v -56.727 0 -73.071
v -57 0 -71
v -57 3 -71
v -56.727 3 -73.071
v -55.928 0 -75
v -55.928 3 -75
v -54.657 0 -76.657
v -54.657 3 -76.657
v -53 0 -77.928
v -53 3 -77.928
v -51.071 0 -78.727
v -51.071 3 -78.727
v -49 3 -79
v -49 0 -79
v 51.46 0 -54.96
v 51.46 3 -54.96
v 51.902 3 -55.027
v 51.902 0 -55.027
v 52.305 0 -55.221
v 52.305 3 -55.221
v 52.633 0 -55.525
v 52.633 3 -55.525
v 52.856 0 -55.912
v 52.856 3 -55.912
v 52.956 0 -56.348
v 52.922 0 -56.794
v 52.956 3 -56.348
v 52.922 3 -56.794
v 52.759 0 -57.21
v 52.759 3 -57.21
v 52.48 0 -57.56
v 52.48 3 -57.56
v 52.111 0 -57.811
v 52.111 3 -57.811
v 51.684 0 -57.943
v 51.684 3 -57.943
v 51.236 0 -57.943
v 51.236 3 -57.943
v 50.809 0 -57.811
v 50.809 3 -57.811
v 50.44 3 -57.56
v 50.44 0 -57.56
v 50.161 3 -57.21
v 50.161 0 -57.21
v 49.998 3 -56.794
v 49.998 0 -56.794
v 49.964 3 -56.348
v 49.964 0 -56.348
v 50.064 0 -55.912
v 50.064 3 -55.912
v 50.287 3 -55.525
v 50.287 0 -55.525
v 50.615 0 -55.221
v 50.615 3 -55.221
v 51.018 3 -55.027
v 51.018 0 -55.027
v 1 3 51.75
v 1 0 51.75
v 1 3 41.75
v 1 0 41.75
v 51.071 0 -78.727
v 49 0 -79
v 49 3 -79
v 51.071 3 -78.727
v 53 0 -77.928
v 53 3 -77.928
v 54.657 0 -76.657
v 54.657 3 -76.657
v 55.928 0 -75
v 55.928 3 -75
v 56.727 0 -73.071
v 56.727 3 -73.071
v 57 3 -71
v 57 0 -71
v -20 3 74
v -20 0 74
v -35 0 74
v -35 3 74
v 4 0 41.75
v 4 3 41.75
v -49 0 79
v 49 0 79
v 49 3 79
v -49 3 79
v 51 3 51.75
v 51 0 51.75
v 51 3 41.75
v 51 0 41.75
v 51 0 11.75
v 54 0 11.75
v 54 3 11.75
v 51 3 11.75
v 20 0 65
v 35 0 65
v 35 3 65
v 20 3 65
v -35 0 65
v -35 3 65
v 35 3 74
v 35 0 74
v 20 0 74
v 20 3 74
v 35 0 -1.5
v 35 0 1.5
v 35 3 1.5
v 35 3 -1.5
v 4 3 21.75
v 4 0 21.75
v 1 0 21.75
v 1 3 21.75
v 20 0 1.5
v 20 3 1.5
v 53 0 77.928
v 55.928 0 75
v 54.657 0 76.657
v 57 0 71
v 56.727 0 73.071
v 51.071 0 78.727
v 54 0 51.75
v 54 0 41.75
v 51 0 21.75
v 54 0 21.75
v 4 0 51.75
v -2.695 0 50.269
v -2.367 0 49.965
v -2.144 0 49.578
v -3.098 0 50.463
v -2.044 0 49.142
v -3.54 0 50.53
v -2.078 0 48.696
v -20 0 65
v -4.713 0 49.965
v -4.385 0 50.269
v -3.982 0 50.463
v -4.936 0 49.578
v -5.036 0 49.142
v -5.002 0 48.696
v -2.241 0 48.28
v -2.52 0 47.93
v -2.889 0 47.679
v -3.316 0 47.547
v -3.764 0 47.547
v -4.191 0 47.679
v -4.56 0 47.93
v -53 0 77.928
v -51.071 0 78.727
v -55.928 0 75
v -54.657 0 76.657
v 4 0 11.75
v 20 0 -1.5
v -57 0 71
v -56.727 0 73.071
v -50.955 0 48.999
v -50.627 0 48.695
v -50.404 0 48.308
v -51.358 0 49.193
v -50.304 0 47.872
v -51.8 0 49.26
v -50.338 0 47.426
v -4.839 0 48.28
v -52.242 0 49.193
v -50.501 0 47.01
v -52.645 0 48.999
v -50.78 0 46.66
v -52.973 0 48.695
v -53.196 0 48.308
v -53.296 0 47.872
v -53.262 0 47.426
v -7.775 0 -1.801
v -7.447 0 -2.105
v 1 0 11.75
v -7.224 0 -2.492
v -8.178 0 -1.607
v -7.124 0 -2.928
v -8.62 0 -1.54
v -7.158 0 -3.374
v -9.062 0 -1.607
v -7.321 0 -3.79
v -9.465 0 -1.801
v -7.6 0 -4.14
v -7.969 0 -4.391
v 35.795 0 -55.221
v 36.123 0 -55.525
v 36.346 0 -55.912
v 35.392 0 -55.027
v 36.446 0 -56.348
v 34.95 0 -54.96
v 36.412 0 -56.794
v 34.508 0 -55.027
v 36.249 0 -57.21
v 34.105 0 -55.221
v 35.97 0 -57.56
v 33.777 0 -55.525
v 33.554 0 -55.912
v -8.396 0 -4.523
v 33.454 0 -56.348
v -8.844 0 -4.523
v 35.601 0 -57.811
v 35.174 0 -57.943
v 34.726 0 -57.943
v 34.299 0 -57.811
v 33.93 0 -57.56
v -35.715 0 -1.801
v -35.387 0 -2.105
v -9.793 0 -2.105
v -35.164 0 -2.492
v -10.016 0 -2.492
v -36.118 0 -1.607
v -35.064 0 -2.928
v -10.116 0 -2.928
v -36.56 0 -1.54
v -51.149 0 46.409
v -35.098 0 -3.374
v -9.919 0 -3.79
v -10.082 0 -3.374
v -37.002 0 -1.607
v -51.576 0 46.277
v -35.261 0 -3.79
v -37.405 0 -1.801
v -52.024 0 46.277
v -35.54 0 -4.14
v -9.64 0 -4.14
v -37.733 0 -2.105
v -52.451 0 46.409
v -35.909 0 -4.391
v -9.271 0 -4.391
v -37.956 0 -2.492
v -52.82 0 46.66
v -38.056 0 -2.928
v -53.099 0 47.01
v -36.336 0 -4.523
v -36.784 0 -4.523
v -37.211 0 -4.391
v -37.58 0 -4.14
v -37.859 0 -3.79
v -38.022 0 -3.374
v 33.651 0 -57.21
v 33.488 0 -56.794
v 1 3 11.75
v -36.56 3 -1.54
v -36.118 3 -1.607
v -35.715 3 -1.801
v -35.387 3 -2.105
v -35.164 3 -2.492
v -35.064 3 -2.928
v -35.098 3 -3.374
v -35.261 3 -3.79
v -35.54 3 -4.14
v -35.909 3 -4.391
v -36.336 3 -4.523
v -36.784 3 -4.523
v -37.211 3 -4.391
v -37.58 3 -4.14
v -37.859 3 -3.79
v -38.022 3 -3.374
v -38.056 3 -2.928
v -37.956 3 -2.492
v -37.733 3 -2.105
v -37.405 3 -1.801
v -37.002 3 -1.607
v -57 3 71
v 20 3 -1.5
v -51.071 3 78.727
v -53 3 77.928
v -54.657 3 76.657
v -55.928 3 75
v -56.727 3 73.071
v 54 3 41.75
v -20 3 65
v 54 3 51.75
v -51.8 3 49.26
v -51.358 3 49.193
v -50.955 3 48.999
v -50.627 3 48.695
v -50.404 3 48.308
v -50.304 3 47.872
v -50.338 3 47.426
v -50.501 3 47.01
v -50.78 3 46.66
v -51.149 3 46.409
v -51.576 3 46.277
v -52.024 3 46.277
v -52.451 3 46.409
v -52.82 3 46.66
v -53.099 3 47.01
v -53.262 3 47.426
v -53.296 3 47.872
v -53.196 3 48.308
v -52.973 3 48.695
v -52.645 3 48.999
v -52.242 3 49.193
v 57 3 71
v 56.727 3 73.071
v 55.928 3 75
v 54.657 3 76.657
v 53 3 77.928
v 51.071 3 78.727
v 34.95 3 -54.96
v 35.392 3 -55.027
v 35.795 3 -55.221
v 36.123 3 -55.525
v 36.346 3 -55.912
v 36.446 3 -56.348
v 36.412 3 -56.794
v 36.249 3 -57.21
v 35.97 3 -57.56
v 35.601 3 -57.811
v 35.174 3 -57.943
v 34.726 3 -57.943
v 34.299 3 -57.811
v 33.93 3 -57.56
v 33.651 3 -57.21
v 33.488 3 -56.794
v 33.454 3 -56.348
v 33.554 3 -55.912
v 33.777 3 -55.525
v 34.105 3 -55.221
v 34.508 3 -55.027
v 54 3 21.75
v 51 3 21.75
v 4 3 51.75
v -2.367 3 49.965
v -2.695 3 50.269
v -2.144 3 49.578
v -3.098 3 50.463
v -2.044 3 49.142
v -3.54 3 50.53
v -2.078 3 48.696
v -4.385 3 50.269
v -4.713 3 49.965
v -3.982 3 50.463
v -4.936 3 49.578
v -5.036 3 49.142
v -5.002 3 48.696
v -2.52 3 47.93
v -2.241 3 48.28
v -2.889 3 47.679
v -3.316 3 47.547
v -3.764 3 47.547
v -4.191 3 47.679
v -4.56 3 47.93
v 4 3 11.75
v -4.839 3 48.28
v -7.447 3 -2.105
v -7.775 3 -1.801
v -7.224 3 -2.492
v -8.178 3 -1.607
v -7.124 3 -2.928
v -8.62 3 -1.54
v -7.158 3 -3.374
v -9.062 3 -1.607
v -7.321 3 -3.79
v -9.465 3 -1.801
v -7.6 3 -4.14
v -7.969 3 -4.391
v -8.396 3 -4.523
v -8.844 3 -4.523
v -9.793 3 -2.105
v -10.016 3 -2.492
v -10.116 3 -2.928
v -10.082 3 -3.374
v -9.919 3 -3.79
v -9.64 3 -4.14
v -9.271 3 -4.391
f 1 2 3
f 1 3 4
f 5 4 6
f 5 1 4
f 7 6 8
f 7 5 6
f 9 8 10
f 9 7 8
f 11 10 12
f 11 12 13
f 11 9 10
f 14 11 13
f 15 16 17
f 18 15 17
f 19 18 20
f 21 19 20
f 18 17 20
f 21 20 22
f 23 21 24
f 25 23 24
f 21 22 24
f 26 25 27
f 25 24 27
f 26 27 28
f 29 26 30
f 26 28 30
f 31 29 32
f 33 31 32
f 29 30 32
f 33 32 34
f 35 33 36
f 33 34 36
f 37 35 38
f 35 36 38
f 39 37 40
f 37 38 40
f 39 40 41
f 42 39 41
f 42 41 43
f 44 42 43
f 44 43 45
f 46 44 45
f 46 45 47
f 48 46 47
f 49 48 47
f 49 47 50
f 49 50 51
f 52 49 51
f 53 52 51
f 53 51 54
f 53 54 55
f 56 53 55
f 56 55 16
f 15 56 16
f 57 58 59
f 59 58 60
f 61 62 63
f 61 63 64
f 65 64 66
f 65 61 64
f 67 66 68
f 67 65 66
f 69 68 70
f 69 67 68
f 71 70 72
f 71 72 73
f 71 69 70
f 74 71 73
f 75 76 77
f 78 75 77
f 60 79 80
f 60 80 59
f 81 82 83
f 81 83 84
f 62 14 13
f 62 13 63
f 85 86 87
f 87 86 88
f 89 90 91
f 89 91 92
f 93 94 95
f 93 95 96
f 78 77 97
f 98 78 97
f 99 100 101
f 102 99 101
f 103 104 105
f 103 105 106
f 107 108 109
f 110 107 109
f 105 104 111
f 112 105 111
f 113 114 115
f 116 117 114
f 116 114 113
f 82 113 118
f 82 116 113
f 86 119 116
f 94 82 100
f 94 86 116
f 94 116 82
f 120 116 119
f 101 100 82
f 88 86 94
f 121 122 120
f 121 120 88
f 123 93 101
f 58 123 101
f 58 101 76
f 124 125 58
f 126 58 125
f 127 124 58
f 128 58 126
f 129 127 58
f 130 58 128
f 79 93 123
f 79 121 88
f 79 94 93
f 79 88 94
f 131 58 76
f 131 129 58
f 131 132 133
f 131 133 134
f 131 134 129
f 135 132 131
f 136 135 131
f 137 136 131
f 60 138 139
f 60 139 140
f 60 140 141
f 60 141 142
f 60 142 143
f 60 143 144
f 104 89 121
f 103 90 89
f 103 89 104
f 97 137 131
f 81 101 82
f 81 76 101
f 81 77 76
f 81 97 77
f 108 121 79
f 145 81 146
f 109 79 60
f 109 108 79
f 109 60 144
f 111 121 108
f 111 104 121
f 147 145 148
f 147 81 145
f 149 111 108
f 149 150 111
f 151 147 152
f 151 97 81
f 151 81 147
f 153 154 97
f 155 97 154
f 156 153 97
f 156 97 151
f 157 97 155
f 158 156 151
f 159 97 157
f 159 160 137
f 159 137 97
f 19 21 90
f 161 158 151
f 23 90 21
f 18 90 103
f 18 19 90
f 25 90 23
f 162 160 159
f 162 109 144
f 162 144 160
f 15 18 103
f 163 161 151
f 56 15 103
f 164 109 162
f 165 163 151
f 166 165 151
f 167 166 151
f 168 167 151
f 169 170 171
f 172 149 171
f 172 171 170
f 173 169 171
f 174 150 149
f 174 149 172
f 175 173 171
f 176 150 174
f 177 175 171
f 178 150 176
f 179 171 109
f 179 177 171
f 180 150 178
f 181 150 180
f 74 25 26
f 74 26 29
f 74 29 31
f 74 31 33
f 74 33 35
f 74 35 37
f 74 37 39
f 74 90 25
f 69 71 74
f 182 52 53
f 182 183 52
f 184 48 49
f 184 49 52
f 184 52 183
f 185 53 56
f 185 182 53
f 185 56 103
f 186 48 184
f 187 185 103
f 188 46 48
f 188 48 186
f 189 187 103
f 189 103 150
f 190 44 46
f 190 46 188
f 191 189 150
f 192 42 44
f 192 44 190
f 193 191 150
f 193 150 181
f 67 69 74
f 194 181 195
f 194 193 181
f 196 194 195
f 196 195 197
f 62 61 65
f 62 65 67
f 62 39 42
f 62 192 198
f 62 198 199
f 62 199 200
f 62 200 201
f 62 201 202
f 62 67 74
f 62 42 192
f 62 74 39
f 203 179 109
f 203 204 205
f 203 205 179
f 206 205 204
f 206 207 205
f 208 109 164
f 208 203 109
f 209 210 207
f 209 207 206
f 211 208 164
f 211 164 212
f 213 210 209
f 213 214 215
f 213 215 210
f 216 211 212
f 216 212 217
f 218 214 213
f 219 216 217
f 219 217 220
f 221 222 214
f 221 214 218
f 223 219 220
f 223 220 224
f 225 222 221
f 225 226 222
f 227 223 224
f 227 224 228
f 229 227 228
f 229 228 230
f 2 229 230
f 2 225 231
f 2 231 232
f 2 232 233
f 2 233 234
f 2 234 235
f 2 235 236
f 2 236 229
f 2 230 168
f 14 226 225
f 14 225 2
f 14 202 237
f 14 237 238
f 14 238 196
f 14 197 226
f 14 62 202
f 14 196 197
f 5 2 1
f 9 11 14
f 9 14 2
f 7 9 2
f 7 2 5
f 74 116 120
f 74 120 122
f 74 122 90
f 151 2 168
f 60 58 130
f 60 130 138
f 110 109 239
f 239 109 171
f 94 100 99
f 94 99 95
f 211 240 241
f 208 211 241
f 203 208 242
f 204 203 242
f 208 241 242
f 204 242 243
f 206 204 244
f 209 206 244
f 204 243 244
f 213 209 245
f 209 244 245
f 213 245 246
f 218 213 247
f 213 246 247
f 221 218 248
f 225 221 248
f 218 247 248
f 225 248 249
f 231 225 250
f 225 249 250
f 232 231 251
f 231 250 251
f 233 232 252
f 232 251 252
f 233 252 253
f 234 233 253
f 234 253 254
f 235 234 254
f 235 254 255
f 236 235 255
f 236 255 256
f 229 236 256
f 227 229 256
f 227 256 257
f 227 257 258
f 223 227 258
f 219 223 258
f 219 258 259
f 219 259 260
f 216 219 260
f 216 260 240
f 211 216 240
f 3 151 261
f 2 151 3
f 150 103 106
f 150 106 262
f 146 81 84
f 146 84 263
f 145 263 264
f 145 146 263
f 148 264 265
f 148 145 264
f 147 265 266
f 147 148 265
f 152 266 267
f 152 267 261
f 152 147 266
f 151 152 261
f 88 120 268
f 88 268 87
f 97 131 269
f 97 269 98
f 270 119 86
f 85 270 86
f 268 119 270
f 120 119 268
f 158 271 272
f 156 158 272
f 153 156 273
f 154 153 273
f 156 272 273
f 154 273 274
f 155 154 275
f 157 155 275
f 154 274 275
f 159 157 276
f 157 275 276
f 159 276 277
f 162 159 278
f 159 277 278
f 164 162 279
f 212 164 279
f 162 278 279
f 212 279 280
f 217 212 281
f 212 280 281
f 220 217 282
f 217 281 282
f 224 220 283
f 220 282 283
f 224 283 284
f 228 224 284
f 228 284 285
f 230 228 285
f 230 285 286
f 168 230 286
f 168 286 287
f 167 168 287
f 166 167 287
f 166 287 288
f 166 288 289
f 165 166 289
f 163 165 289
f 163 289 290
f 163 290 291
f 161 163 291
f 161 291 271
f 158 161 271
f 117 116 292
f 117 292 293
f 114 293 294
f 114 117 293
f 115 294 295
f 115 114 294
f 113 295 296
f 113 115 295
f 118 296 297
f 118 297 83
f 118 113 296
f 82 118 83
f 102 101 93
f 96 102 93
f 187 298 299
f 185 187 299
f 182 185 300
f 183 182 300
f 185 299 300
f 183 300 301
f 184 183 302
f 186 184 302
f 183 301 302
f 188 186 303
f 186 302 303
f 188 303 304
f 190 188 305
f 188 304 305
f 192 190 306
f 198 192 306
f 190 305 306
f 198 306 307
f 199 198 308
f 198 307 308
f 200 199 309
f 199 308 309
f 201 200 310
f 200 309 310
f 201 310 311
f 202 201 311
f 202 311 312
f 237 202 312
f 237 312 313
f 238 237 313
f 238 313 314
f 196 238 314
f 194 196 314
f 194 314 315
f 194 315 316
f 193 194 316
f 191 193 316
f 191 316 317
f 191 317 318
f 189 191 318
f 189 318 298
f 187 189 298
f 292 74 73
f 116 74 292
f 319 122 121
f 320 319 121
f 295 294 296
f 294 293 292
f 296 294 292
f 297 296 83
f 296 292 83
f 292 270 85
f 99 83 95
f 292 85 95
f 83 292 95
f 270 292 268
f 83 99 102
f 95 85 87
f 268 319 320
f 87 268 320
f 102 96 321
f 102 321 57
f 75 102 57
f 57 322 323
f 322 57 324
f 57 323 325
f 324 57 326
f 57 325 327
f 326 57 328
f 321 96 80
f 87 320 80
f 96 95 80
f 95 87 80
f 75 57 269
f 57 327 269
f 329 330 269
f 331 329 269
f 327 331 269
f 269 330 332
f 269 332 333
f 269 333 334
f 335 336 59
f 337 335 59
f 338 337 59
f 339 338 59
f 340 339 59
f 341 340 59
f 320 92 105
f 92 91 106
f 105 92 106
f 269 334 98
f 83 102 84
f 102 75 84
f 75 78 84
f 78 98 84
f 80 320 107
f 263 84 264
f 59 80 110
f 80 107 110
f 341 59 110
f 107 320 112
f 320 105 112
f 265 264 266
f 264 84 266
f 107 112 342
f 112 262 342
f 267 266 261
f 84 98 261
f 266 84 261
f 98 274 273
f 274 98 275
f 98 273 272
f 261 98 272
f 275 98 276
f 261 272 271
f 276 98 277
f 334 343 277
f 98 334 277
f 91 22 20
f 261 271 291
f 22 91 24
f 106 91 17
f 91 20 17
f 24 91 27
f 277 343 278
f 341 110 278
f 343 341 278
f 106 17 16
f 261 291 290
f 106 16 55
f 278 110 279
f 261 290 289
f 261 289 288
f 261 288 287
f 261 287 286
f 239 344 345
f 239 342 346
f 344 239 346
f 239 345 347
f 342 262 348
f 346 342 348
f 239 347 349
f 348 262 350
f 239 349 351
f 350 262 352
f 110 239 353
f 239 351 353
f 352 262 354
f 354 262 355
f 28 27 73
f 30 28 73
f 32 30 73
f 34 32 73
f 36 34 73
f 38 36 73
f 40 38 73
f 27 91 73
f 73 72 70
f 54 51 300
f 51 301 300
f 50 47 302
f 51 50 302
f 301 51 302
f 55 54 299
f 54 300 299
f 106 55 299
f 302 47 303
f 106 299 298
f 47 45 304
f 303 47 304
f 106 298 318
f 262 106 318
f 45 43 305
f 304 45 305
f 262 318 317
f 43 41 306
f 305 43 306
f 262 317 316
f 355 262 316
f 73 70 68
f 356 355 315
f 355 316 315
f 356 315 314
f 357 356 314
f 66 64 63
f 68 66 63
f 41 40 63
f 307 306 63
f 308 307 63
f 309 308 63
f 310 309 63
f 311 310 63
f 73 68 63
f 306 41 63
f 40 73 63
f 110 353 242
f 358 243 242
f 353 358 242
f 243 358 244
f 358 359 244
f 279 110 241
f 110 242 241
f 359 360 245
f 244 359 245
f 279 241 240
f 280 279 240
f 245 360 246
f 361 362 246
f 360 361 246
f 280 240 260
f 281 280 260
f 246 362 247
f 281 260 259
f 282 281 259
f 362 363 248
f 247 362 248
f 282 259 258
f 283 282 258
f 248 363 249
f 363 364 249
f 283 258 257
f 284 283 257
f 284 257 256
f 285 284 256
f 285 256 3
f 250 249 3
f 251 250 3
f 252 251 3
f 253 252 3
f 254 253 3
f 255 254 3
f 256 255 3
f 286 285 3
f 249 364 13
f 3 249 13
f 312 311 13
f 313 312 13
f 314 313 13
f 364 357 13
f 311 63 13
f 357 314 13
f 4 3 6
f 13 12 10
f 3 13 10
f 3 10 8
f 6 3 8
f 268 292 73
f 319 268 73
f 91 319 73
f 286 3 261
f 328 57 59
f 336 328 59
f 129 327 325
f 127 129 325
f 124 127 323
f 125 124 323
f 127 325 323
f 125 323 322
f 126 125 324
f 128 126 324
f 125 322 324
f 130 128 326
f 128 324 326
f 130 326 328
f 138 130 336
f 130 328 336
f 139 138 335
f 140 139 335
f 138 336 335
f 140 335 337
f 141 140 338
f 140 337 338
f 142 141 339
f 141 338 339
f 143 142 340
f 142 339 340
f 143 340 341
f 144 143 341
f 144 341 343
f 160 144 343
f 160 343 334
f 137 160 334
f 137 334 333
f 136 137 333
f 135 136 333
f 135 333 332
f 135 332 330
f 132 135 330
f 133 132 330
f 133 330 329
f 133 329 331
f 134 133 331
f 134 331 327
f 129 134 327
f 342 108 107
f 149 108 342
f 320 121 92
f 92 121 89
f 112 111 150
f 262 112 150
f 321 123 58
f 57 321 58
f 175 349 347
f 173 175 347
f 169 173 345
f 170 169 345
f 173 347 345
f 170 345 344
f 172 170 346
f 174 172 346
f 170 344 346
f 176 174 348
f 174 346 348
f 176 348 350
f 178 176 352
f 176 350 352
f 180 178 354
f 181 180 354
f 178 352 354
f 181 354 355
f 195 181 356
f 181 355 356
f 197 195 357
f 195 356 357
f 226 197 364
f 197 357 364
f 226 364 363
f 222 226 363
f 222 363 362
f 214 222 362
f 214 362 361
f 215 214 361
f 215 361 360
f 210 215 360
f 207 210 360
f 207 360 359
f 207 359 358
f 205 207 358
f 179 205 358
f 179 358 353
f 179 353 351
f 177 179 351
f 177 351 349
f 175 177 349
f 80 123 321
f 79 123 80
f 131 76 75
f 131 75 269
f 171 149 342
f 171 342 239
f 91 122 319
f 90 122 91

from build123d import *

# Parameters (mm, degrees)
BOSS_EXTRUDE1_DEPTH = 3
SKETCH2_R           = 1.5
CUT_EXTRUDE1_DEPTH  = 98.462813421
SKETCH3_W           = 15
SKETCH3_H           = 9
SKETCH3_W_2         = 3
SKETCH3_H_2         = 10
SKETCH3_H_3         = 3
CUT_EXTRUDE2_DEPTH  = 98.462813421


with BuildPart() as part:
    # Sketch1 → Boss-Extrude1 (new body)
    with BuildSketch(Plane(origin=(0, 0, 0), x_dir=(1, 0, 0), z_dir=(0, 1, 0))):
        with BuildLine():
            Line((-49, 79), (49, 79))
            ThreePointArc((49, 79), (54.656854249, 76.656854249), (57, 71))
            Line((57, 71), (57, -71))
            ThreePointArc((57, -71), (54.656854249, -76.656854249), (49, -79))
            Line((49, -79), (-49, -79))
            ThreePointArc((-49, -79), (-54.656854249, -76.656854249), (-57, -71))
            Line((-57, -71), (-57, 71))
            ThreePointArc((-57, 71), (-54.656854249, 76.656854249), (-49, 79))
        make_face()
    extrude(amount=BOSS_EXTRUDE1_DEPTH)

    # Sketch2 → Cut-Extrude1 (cut, through all)
    with BuildSketch(Plane(origin=(0, 3, 0), x_dir=(1, 0, 0), z_dir=(0, 1, 0))):
        with Locations(Location((-36.56, 3.04, 0), (0, 0, 270))):
            Circle(SKETCH2_R)
        with Locations(Location((-8.62, 3.04, 0), (0, 0, 270))):
            Circle(SKETCH2_R)
        with Locations(Location((-51.8, -47.76, 0), (0, 0, 270))):
            Circle(SKETCH2_R)
        with Locations(Location((-3.54, -49.03, 0), (0, 0, 270))):
            Circle(SKETCH2_R)
        with Locations(Location((34.95, 56.46, 0), (0, 0, 270))):
            Circle(SKETCH2_R)
        with Locations(Location((51.46, 56.46, 0), (0, 0, 270))):
            Circle(SKETCH2_R)
    extrude(amount=-CUT_EXTRUDE1_DEPTH, mode=Mode.SUBTRACT)

    # Sketch3 → Cut-Extrude2 (cut, through all)
    with BuildSketch(Plane(origin=(0, 0, 0), x_dir=(-1, 0, 0), z_dir=(0, -1, 0))):
        with Locations((27.5, -69.5)):
            Rectangle(SKETCH3_W, SKETCH3_H)
        with Locations((-27.5, -69.5)):
            Rectangle(SKETCH3_W, SKETCH3_H)
        with Locations((-2.5, -46.75)):
            Rectangle(SKETCH3_W_2, SKETCH3_H_2)
        with Locations((-2.5, -16.75)):
            Rectangle(SKETCH3_W_2, SKETCH3_H_2)
        with Locations((-27.5, 0)):
            Rectangle(SKETCH3_W, SKETCH3_H_3)
        with Locations((-52.5, -16.75)):
            Rectangle(SKETCH3_W_2, SKETCH3_H_2)
        with Locations((-52.5, -46.75)):
            Rectangle(SKETCH3_W_2, SKETCH3_H_2)
    extrude(amount=-CUT_EXTRUDE2_DEPTH, mode=Mode.SUBTRACT)


solid = part.part
